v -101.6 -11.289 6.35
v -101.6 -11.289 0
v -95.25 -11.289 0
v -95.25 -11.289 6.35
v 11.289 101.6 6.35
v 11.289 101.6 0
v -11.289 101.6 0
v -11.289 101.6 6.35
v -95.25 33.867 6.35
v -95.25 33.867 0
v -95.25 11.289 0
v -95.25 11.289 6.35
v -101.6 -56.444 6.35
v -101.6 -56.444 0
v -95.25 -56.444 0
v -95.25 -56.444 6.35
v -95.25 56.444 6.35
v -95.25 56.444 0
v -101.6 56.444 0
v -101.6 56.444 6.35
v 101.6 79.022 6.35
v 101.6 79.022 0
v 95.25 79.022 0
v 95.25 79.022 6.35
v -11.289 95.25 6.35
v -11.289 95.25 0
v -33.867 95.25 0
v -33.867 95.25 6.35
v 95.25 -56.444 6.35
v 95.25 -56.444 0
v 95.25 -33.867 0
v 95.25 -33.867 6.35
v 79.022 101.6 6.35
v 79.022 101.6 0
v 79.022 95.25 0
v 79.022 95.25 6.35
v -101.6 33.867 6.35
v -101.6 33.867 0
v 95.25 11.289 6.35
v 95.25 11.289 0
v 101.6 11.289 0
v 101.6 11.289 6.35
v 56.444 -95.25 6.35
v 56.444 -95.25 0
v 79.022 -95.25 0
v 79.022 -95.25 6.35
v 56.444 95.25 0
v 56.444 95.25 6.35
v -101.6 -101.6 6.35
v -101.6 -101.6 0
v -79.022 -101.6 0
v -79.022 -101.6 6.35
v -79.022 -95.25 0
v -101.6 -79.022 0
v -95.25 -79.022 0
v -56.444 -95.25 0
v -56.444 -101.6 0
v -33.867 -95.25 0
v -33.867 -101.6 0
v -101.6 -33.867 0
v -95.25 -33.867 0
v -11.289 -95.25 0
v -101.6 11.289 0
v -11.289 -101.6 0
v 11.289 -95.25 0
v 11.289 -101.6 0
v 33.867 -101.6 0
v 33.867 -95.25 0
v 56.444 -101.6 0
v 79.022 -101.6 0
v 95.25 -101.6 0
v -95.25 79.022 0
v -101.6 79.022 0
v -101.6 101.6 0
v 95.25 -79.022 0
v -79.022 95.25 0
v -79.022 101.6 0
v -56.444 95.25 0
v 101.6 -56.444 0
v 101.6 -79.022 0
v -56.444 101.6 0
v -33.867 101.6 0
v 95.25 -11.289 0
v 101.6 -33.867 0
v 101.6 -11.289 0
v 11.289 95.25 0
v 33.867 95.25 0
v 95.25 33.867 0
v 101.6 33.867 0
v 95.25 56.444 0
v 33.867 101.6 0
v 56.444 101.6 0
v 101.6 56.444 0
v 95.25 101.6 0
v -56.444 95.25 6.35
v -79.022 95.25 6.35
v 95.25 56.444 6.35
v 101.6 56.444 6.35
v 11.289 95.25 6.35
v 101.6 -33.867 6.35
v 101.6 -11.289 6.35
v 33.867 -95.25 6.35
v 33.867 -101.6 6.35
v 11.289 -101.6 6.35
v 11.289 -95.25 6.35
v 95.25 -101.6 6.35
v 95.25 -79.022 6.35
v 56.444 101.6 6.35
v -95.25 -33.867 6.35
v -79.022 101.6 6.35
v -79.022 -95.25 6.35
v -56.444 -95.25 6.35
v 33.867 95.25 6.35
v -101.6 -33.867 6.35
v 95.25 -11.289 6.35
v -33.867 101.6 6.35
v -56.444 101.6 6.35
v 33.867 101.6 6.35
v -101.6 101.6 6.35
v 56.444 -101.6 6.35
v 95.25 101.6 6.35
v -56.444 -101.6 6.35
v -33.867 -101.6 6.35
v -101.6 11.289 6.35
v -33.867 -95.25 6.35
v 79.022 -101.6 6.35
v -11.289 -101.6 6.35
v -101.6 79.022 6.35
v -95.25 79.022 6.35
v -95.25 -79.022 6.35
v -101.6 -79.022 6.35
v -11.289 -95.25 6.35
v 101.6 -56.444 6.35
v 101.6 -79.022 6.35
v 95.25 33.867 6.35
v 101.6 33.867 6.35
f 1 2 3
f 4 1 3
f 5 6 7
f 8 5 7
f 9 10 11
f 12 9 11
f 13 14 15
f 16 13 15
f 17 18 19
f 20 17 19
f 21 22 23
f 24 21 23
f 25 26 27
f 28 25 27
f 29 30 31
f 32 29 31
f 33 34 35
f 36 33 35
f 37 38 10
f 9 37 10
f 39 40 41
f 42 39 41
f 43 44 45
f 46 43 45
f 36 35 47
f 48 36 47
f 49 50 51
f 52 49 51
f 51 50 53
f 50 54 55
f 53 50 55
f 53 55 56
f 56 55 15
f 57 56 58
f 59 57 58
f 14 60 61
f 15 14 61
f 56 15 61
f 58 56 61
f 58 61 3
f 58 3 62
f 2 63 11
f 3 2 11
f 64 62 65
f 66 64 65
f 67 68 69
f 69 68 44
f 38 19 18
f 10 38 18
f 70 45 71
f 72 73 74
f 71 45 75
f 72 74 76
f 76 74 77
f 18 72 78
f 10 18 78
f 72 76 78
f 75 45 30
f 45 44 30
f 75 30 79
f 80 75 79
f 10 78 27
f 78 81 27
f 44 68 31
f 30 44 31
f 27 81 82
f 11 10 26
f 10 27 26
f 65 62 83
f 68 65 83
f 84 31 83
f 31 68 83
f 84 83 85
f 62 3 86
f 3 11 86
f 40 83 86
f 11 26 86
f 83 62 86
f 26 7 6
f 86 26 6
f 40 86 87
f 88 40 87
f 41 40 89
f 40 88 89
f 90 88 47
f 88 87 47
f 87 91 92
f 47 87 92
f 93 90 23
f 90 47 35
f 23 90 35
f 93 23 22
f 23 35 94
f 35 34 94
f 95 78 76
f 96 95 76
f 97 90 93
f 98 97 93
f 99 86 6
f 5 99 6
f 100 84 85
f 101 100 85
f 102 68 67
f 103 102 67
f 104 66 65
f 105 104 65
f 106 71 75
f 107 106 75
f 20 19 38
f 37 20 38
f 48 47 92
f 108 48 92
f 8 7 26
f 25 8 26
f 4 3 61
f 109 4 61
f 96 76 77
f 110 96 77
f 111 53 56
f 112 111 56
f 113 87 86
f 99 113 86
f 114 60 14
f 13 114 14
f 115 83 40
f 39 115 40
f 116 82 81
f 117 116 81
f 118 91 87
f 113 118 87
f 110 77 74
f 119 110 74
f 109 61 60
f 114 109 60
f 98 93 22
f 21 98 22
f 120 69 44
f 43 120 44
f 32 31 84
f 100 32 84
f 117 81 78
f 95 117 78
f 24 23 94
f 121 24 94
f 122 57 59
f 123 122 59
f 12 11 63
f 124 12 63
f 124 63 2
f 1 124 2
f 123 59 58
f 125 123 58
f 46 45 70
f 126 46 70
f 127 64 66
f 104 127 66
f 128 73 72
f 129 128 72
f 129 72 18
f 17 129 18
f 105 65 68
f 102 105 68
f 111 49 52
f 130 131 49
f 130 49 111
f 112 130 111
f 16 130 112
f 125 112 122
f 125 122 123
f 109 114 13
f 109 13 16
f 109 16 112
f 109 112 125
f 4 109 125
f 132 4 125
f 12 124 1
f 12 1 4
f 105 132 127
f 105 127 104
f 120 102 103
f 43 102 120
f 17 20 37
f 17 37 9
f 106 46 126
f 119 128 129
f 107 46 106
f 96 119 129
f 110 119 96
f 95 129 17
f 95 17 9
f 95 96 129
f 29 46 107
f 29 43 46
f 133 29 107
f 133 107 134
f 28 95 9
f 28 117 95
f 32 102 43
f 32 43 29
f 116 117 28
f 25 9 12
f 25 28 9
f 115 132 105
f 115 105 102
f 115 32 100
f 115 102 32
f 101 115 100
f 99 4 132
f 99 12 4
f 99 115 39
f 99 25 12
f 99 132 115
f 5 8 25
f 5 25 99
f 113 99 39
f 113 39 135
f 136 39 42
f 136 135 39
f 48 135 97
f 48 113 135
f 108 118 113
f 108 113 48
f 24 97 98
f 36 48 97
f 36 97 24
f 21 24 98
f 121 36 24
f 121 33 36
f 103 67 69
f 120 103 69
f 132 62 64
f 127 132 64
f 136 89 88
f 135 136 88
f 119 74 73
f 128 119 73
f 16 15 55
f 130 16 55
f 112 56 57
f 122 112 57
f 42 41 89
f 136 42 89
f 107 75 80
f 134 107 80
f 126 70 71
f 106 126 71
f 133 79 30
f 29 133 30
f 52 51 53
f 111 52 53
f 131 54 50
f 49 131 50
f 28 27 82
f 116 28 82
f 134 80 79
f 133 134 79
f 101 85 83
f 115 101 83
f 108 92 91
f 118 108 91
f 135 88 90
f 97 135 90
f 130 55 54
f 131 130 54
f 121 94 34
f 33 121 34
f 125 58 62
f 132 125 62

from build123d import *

# Parameters (mm, degrees)
F1_DEPTH = 6.35


with BuildPart() as f1:
    # F0 (on Top) → F1 (new body)
    with BuildSketch(Plane.XY):
        Polygon((-79.022222, 95.25), (-79.022222, 101.6), (-101.6, 101.6), (-101.6, 79.022222), (-95.25, 79.022222), (-95.25, 56.444444), (-101.6, 56.444444), (-101.6, 33.866667), (-95.25, 33.866667), (-95.25, 11.288889), (-101.6, 11.288889), (-101.6, 0), (-101.6, -11.288889), (-95.25, -11.288889), (-95.25, -33.866667), (-101.6, -33.866667), (-101.6, -56.444444), (-95.25, -56.444444), (-95.25, -79.022222), (-101.6, -79.022222), (-101.6, -101.6), (-79.022222, -101.6), (-79.022222, -95.25), (-56.444444, -95.25), (-56.444444, -101.6), (-33.866667, -101.6), (-33.866667, -95.25), (-11.288889, -95.25), (-11.288889, -101.6), (11.288889, -101.6), (11.288889, -95.25), (33.866667, -95.25), (33.866667, -101.6), (56.444444, -101.6), (56.444444, -95.25), (79.022222, -95.25), (79.022222, -101.6), (95.25, -101.6), (95.25, -79.022222), (101.6, -79.022222), (101.6, -56.444444), (95.25, -56.444444), (95.25, -33.866667), (101.6, -33.866667), (101.6, -11.288889), (95.25, -11.288889), (95.25, 0), (95.25, 11.288889), (101.6, 11.288889), (101.6, 33.866667), (95.25, 33.866667), (95.25, 56.444444), (101.6, 56.444444), (101.6, 79.022222), (95.25, 79.022222), (95.25, 101.6), (79.022222, 101.6), (79.022222, 95.25), (56.444444, 95.25), (56.444444, 101.6), (33.866667, 101.6), (33.866667, 95.25), (11.288889, 95.25), (11.288889, 101.6), (-11.288889, 101.6), (-11.288889, 95.25), (-33.866667, 95.25), (-33.866667, 101.6), (-56.444444, 101.6), (-56.444444, 95.25), align=None)
    extrude(amount=F1_DEPTH)


solid = f1.part
